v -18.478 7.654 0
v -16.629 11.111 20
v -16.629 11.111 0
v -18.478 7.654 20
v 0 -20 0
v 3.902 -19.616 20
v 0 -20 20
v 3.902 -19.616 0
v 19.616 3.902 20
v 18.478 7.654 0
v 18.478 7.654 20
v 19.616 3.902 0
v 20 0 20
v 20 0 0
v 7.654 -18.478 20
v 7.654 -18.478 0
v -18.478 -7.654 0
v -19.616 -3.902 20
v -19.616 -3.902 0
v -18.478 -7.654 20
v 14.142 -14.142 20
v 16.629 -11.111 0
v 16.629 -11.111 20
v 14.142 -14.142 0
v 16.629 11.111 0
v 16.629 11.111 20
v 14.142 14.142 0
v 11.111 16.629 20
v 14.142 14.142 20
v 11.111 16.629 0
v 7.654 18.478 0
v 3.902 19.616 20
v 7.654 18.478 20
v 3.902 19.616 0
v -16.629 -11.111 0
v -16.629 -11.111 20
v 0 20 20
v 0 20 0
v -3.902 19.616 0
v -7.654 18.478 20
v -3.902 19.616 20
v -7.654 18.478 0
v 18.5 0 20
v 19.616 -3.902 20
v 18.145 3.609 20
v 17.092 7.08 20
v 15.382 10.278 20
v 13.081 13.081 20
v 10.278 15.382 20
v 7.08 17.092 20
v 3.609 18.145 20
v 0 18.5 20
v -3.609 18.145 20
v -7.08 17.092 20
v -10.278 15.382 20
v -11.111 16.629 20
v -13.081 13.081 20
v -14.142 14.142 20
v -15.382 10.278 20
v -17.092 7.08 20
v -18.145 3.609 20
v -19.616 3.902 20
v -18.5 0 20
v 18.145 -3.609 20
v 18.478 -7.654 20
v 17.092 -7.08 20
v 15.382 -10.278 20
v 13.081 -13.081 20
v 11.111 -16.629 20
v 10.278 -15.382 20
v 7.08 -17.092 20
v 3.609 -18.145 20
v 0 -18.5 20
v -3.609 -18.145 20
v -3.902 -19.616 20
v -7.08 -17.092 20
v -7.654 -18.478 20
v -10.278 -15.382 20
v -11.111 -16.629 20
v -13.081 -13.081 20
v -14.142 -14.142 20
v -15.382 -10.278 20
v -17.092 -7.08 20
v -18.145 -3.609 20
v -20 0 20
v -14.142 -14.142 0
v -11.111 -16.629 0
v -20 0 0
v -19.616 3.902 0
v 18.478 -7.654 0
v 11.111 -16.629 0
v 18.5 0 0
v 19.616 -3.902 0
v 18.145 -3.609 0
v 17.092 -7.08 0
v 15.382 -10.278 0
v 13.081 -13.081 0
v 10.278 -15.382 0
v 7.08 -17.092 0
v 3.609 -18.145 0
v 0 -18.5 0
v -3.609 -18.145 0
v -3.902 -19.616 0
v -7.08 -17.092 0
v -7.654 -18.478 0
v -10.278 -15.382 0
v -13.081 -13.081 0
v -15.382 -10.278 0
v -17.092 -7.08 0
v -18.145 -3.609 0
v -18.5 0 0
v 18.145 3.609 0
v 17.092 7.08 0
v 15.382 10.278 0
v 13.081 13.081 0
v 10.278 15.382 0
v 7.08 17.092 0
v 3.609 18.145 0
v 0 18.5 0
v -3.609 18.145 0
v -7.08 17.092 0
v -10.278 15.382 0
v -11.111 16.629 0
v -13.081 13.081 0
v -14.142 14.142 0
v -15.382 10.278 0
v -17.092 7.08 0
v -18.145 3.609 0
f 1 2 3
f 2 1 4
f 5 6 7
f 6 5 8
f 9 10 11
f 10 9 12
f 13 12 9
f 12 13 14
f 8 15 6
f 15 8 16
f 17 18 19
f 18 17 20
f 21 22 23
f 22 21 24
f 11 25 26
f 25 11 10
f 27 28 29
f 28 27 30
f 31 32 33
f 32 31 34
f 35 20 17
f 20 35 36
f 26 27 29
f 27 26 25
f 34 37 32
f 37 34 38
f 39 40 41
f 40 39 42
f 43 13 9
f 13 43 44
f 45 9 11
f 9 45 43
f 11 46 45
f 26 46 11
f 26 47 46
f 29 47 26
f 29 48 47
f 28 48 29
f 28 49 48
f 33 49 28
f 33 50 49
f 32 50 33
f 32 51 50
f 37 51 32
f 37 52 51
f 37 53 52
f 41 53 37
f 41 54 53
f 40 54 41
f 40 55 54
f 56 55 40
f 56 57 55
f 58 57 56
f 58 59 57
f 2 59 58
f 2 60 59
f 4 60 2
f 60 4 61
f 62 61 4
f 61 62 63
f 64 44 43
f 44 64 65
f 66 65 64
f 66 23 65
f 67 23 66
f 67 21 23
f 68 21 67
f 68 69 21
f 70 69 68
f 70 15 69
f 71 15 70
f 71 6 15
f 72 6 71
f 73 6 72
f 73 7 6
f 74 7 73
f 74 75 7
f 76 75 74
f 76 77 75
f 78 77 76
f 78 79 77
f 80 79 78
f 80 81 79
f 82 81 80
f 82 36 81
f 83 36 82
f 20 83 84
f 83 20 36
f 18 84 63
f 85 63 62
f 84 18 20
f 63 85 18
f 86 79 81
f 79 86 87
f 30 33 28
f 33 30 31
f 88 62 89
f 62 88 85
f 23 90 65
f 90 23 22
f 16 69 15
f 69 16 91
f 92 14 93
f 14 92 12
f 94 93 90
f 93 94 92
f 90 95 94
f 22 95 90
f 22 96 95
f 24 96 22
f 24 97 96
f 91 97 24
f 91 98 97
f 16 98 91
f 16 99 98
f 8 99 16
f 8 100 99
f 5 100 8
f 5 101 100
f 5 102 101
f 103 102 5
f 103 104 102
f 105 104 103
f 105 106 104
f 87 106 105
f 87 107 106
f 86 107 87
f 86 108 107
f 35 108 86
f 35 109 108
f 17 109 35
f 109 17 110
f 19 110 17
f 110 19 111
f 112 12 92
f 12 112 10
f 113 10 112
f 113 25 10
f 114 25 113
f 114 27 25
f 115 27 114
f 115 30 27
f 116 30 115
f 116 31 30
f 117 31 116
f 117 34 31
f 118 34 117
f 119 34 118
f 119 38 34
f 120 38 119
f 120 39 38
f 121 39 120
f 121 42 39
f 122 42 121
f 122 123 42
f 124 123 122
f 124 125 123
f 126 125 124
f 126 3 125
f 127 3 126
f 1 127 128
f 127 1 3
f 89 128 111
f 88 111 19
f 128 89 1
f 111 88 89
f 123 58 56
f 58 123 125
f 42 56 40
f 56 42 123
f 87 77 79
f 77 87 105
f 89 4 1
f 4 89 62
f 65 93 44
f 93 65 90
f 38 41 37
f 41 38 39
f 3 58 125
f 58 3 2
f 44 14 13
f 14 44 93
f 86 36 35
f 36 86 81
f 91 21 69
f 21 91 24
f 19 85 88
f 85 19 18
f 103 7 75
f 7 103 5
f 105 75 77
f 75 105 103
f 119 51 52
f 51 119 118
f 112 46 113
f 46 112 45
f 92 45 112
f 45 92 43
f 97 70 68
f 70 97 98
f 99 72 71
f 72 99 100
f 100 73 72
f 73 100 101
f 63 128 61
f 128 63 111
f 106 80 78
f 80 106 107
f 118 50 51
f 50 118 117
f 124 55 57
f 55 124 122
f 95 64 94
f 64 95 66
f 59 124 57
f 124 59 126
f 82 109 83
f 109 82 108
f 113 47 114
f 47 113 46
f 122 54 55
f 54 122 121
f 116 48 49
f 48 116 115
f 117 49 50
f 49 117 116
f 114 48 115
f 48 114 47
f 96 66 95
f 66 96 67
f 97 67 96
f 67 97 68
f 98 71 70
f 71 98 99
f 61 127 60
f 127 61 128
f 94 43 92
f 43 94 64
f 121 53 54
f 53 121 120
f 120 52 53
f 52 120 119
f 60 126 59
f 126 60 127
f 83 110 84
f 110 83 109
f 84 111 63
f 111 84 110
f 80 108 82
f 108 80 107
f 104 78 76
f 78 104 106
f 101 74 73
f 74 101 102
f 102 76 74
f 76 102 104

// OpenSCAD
$fn = 32;

// ----------------------------------------------------------------------
// Thin tube: 1.5 mm wall
// ----------------------------------------------------------------------

// --- parameters (mm) ---
tube_od = 40;             // outer diameter
tube_h = 20;              // height, Z
wall = 1.5;               // wall thickness
fit_tol = 0.05;           // tolerance for press fits, mm
free_tol = 0.3;           // tolerance for clearance fits, mm

difference() {
  cylinder(h = tube_h, d = tube_od);
  translate([0, 0, -1]) cylinder(h = tube_h + 2, d = tube_od - 2 * wall);
}
